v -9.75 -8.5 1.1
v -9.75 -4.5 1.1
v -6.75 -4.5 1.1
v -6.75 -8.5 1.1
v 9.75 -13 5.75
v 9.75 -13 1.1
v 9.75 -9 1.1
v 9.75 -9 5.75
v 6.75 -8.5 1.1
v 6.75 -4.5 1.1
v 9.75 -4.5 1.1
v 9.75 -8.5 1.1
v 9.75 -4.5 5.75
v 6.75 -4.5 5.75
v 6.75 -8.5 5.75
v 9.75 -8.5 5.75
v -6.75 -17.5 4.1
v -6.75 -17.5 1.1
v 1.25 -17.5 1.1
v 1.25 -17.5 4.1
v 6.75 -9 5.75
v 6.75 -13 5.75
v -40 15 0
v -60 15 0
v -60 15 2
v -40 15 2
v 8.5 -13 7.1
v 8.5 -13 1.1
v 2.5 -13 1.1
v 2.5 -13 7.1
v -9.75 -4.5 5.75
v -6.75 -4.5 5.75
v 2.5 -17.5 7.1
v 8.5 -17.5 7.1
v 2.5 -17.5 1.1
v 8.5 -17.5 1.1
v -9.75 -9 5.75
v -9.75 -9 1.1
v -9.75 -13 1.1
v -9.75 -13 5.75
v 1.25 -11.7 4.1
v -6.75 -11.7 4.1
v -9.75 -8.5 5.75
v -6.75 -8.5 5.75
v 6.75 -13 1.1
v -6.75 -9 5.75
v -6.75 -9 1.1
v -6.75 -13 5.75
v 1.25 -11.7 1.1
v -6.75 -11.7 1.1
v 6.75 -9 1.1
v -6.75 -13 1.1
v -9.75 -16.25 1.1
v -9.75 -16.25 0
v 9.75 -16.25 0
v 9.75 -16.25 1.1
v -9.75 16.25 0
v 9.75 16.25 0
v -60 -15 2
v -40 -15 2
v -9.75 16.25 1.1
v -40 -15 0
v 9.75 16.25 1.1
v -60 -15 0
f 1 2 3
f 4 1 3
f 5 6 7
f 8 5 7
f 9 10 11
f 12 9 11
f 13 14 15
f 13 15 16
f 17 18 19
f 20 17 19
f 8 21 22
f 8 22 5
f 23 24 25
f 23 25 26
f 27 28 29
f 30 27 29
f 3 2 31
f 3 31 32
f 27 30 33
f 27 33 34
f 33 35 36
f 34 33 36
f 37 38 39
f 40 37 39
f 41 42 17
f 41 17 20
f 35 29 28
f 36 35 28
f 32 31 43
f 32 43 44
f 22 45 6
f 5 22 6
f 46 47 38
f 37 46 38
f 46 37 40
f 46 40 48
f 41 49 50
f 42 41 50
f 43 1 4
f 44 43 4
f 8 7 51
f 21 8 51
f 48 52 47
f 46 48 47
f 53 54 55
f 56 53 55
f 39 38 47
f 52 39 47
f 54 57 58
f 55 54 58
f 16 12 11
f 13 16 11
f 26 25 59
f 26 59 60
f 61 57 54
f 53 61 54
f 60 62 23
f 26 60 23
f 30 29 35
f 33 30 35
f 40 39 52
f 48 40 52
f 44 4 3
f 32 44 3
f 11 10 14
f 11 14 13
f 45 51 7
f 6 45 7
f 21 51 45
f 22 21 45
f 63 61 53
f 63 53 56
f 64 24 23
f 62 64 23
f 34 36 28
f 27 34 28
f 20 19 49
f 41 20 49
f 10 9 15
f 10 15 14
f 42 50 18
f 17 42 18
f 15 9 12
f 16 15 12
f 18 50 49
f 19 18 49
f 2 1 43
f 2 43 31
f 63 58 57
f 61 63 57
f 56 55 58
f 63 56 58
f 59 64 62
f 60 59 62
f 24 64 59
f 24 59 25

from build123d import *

# Parameters (mm, degrees)
F0_W     = 3
F0_H     = 4
F0_H_2   = 3.25
F0_W_2   = 1.25
F1_DEPTH = 1.1
F2_START = 1.1
F0_W_3   = 8
F0_H_3   = 1.25
F2_DEPTH = 3
F3_START = 1.1
F3_DEPTH = 4.65
F4_START = 1.1
F0_W_4   = 6
F4_DEPTH = 6
F5_W     = 20
F5_H     = 30
F6_DEPTH = 2


with BuildPart() as f1:
    # F0 (on Top) → F1 (new body)
    with BuildSketch(Plane.XY):
        Polygon((9.75, 16.25), (-9.75, 16.25), (-9.75, -4.5), (-6.75, -4.5), (-6.75, -8.5), (-9.75, -8.5), (-9.75, -9), (-6.75, -9), (-6.75, -11.7), (1.25, -11.7), (1.25, -16.25), (2.5, -16.25), (2.5, -13), (6.75, -13), (6.75, -9), (9.75, -9), (9.75, -8.5), (6.75, -8.5), (6.75, -4.5), (9.75, -4.5), align=None)
        with Locations((-8.25, -6.5)):
            Rectangle(F0_W, F0_H)
        Polygon((-6.75, -9), (-9.75, -9), (-9.75, -13), (-6.75, -13), (-6.75, -11.7), align=None)
        with Locations((-8.25, -14.625)):
            Rectangle(F0_W, F0_H_2)
        Polygon((-6.75, -11.7), (-6.75, -13), (-6.75, -16.25), (1.25, -16.25), (1.25, -11.7), align=None)
        Polygon((8.5, -16.25), (8.5, -13), (6.75, -13), (2.5, -13), (2.5, -16.25), align=None)
        with Locations((9.125, -14.625)):
            Rectangle(F0_W_2, F0_H_2)
        Polygon((9.75, -13), (9.75, -9), (6.75, -9), (6.75, -13), (8.5, -13), align=None)
        with Locations((8.25, -6.5)):
            Rectangle(F0_W, F0_H)
    extrude(amount=F1_DEPTH)


with BuildPart() as f2:
    # F0 (on Top) → F2 (new body)
    with BuildSketch(Plane.XY.offset(F2_START)):
        Polygon((-6.75, -11.7), (-6.75, -13), (-6.75, -16.25), (1.25, -16.25), (1.25, -11.7), align=None)
        with Locations((-2.75, -16.875)):
            Rectangle(F0_W_3, F0_H_3)
    extrude(amount=F2_DEPTH)


with BuildPart() as f3:
    # F0 (on Top) → F3 (new body)
    with BuildSketch(Plane.XY.offset(F3_START)):
        Polygon((-6.75, -9), (-9.75, -9), (-9.75, -13), (-6.75, -13), (-6.75, -11.7), align=None)
    extrude(amount=F3_DEPTH)


with BuildPart() as f3b:
    # F0 (on Top) → F3, piece 2 (new body)
    with BuildSketch(Plane.XY.offset(F3_START)):
        with Locations((-8.25, -6.5)):
            Rectangle(F0_W, F0_H)
    extrude(amount=F3_DEPTH)


with BuildPart() as f3c:
    # F0 (on Top) → F3, piece 3 (new body)
    with BuildSketch(Plane.XY.offset(F3_START)):
        Polygon((9.75, -13), (9.75, -9), (6.75, -9), (6.75, -13), (8.5, -13), align=None)
    extrude(amount=F3_DEPTH)


with BuildPart() as f3d:
    # F0 (on Top) → F3, piece 4 (new body)
    with BuildSketch(Plane.XY.offset(F3_START)):
        with Locations((8.25, -6.5)):
            Rectangle(F0_W, F0_H)
    extrude(amount=F3_DEPTH)


with BuildPart() as f4:
    # F0 (on Top) → F4 (new body)
    with BuildSketch(Plane.XY.offset(F4_START)):
        Polygon((8.5, -16.25), (8.5, -13), (6.75, -13), (2.5, -13), (2.5, -16.25), align=None)
        with Locations((5.5, -16.875)):
            Rectangle(F0_W_4, F0_H_3)
    extrude(amount=F4_DEPTH)


with BuildPart() as f6:
    # F5 (on Top) → F6 (new body)
    with BuildSketch(Plane.XY):
        with Locations((-50, 0)):
            Rectangle(F5_W, F5_H)
    extrude(amount=F6_DEPTH)


solid = Compound([f1.part, f2.part, f3.part, f3b.part, f3c.part, f3d.part, f4.part, f6.part])
